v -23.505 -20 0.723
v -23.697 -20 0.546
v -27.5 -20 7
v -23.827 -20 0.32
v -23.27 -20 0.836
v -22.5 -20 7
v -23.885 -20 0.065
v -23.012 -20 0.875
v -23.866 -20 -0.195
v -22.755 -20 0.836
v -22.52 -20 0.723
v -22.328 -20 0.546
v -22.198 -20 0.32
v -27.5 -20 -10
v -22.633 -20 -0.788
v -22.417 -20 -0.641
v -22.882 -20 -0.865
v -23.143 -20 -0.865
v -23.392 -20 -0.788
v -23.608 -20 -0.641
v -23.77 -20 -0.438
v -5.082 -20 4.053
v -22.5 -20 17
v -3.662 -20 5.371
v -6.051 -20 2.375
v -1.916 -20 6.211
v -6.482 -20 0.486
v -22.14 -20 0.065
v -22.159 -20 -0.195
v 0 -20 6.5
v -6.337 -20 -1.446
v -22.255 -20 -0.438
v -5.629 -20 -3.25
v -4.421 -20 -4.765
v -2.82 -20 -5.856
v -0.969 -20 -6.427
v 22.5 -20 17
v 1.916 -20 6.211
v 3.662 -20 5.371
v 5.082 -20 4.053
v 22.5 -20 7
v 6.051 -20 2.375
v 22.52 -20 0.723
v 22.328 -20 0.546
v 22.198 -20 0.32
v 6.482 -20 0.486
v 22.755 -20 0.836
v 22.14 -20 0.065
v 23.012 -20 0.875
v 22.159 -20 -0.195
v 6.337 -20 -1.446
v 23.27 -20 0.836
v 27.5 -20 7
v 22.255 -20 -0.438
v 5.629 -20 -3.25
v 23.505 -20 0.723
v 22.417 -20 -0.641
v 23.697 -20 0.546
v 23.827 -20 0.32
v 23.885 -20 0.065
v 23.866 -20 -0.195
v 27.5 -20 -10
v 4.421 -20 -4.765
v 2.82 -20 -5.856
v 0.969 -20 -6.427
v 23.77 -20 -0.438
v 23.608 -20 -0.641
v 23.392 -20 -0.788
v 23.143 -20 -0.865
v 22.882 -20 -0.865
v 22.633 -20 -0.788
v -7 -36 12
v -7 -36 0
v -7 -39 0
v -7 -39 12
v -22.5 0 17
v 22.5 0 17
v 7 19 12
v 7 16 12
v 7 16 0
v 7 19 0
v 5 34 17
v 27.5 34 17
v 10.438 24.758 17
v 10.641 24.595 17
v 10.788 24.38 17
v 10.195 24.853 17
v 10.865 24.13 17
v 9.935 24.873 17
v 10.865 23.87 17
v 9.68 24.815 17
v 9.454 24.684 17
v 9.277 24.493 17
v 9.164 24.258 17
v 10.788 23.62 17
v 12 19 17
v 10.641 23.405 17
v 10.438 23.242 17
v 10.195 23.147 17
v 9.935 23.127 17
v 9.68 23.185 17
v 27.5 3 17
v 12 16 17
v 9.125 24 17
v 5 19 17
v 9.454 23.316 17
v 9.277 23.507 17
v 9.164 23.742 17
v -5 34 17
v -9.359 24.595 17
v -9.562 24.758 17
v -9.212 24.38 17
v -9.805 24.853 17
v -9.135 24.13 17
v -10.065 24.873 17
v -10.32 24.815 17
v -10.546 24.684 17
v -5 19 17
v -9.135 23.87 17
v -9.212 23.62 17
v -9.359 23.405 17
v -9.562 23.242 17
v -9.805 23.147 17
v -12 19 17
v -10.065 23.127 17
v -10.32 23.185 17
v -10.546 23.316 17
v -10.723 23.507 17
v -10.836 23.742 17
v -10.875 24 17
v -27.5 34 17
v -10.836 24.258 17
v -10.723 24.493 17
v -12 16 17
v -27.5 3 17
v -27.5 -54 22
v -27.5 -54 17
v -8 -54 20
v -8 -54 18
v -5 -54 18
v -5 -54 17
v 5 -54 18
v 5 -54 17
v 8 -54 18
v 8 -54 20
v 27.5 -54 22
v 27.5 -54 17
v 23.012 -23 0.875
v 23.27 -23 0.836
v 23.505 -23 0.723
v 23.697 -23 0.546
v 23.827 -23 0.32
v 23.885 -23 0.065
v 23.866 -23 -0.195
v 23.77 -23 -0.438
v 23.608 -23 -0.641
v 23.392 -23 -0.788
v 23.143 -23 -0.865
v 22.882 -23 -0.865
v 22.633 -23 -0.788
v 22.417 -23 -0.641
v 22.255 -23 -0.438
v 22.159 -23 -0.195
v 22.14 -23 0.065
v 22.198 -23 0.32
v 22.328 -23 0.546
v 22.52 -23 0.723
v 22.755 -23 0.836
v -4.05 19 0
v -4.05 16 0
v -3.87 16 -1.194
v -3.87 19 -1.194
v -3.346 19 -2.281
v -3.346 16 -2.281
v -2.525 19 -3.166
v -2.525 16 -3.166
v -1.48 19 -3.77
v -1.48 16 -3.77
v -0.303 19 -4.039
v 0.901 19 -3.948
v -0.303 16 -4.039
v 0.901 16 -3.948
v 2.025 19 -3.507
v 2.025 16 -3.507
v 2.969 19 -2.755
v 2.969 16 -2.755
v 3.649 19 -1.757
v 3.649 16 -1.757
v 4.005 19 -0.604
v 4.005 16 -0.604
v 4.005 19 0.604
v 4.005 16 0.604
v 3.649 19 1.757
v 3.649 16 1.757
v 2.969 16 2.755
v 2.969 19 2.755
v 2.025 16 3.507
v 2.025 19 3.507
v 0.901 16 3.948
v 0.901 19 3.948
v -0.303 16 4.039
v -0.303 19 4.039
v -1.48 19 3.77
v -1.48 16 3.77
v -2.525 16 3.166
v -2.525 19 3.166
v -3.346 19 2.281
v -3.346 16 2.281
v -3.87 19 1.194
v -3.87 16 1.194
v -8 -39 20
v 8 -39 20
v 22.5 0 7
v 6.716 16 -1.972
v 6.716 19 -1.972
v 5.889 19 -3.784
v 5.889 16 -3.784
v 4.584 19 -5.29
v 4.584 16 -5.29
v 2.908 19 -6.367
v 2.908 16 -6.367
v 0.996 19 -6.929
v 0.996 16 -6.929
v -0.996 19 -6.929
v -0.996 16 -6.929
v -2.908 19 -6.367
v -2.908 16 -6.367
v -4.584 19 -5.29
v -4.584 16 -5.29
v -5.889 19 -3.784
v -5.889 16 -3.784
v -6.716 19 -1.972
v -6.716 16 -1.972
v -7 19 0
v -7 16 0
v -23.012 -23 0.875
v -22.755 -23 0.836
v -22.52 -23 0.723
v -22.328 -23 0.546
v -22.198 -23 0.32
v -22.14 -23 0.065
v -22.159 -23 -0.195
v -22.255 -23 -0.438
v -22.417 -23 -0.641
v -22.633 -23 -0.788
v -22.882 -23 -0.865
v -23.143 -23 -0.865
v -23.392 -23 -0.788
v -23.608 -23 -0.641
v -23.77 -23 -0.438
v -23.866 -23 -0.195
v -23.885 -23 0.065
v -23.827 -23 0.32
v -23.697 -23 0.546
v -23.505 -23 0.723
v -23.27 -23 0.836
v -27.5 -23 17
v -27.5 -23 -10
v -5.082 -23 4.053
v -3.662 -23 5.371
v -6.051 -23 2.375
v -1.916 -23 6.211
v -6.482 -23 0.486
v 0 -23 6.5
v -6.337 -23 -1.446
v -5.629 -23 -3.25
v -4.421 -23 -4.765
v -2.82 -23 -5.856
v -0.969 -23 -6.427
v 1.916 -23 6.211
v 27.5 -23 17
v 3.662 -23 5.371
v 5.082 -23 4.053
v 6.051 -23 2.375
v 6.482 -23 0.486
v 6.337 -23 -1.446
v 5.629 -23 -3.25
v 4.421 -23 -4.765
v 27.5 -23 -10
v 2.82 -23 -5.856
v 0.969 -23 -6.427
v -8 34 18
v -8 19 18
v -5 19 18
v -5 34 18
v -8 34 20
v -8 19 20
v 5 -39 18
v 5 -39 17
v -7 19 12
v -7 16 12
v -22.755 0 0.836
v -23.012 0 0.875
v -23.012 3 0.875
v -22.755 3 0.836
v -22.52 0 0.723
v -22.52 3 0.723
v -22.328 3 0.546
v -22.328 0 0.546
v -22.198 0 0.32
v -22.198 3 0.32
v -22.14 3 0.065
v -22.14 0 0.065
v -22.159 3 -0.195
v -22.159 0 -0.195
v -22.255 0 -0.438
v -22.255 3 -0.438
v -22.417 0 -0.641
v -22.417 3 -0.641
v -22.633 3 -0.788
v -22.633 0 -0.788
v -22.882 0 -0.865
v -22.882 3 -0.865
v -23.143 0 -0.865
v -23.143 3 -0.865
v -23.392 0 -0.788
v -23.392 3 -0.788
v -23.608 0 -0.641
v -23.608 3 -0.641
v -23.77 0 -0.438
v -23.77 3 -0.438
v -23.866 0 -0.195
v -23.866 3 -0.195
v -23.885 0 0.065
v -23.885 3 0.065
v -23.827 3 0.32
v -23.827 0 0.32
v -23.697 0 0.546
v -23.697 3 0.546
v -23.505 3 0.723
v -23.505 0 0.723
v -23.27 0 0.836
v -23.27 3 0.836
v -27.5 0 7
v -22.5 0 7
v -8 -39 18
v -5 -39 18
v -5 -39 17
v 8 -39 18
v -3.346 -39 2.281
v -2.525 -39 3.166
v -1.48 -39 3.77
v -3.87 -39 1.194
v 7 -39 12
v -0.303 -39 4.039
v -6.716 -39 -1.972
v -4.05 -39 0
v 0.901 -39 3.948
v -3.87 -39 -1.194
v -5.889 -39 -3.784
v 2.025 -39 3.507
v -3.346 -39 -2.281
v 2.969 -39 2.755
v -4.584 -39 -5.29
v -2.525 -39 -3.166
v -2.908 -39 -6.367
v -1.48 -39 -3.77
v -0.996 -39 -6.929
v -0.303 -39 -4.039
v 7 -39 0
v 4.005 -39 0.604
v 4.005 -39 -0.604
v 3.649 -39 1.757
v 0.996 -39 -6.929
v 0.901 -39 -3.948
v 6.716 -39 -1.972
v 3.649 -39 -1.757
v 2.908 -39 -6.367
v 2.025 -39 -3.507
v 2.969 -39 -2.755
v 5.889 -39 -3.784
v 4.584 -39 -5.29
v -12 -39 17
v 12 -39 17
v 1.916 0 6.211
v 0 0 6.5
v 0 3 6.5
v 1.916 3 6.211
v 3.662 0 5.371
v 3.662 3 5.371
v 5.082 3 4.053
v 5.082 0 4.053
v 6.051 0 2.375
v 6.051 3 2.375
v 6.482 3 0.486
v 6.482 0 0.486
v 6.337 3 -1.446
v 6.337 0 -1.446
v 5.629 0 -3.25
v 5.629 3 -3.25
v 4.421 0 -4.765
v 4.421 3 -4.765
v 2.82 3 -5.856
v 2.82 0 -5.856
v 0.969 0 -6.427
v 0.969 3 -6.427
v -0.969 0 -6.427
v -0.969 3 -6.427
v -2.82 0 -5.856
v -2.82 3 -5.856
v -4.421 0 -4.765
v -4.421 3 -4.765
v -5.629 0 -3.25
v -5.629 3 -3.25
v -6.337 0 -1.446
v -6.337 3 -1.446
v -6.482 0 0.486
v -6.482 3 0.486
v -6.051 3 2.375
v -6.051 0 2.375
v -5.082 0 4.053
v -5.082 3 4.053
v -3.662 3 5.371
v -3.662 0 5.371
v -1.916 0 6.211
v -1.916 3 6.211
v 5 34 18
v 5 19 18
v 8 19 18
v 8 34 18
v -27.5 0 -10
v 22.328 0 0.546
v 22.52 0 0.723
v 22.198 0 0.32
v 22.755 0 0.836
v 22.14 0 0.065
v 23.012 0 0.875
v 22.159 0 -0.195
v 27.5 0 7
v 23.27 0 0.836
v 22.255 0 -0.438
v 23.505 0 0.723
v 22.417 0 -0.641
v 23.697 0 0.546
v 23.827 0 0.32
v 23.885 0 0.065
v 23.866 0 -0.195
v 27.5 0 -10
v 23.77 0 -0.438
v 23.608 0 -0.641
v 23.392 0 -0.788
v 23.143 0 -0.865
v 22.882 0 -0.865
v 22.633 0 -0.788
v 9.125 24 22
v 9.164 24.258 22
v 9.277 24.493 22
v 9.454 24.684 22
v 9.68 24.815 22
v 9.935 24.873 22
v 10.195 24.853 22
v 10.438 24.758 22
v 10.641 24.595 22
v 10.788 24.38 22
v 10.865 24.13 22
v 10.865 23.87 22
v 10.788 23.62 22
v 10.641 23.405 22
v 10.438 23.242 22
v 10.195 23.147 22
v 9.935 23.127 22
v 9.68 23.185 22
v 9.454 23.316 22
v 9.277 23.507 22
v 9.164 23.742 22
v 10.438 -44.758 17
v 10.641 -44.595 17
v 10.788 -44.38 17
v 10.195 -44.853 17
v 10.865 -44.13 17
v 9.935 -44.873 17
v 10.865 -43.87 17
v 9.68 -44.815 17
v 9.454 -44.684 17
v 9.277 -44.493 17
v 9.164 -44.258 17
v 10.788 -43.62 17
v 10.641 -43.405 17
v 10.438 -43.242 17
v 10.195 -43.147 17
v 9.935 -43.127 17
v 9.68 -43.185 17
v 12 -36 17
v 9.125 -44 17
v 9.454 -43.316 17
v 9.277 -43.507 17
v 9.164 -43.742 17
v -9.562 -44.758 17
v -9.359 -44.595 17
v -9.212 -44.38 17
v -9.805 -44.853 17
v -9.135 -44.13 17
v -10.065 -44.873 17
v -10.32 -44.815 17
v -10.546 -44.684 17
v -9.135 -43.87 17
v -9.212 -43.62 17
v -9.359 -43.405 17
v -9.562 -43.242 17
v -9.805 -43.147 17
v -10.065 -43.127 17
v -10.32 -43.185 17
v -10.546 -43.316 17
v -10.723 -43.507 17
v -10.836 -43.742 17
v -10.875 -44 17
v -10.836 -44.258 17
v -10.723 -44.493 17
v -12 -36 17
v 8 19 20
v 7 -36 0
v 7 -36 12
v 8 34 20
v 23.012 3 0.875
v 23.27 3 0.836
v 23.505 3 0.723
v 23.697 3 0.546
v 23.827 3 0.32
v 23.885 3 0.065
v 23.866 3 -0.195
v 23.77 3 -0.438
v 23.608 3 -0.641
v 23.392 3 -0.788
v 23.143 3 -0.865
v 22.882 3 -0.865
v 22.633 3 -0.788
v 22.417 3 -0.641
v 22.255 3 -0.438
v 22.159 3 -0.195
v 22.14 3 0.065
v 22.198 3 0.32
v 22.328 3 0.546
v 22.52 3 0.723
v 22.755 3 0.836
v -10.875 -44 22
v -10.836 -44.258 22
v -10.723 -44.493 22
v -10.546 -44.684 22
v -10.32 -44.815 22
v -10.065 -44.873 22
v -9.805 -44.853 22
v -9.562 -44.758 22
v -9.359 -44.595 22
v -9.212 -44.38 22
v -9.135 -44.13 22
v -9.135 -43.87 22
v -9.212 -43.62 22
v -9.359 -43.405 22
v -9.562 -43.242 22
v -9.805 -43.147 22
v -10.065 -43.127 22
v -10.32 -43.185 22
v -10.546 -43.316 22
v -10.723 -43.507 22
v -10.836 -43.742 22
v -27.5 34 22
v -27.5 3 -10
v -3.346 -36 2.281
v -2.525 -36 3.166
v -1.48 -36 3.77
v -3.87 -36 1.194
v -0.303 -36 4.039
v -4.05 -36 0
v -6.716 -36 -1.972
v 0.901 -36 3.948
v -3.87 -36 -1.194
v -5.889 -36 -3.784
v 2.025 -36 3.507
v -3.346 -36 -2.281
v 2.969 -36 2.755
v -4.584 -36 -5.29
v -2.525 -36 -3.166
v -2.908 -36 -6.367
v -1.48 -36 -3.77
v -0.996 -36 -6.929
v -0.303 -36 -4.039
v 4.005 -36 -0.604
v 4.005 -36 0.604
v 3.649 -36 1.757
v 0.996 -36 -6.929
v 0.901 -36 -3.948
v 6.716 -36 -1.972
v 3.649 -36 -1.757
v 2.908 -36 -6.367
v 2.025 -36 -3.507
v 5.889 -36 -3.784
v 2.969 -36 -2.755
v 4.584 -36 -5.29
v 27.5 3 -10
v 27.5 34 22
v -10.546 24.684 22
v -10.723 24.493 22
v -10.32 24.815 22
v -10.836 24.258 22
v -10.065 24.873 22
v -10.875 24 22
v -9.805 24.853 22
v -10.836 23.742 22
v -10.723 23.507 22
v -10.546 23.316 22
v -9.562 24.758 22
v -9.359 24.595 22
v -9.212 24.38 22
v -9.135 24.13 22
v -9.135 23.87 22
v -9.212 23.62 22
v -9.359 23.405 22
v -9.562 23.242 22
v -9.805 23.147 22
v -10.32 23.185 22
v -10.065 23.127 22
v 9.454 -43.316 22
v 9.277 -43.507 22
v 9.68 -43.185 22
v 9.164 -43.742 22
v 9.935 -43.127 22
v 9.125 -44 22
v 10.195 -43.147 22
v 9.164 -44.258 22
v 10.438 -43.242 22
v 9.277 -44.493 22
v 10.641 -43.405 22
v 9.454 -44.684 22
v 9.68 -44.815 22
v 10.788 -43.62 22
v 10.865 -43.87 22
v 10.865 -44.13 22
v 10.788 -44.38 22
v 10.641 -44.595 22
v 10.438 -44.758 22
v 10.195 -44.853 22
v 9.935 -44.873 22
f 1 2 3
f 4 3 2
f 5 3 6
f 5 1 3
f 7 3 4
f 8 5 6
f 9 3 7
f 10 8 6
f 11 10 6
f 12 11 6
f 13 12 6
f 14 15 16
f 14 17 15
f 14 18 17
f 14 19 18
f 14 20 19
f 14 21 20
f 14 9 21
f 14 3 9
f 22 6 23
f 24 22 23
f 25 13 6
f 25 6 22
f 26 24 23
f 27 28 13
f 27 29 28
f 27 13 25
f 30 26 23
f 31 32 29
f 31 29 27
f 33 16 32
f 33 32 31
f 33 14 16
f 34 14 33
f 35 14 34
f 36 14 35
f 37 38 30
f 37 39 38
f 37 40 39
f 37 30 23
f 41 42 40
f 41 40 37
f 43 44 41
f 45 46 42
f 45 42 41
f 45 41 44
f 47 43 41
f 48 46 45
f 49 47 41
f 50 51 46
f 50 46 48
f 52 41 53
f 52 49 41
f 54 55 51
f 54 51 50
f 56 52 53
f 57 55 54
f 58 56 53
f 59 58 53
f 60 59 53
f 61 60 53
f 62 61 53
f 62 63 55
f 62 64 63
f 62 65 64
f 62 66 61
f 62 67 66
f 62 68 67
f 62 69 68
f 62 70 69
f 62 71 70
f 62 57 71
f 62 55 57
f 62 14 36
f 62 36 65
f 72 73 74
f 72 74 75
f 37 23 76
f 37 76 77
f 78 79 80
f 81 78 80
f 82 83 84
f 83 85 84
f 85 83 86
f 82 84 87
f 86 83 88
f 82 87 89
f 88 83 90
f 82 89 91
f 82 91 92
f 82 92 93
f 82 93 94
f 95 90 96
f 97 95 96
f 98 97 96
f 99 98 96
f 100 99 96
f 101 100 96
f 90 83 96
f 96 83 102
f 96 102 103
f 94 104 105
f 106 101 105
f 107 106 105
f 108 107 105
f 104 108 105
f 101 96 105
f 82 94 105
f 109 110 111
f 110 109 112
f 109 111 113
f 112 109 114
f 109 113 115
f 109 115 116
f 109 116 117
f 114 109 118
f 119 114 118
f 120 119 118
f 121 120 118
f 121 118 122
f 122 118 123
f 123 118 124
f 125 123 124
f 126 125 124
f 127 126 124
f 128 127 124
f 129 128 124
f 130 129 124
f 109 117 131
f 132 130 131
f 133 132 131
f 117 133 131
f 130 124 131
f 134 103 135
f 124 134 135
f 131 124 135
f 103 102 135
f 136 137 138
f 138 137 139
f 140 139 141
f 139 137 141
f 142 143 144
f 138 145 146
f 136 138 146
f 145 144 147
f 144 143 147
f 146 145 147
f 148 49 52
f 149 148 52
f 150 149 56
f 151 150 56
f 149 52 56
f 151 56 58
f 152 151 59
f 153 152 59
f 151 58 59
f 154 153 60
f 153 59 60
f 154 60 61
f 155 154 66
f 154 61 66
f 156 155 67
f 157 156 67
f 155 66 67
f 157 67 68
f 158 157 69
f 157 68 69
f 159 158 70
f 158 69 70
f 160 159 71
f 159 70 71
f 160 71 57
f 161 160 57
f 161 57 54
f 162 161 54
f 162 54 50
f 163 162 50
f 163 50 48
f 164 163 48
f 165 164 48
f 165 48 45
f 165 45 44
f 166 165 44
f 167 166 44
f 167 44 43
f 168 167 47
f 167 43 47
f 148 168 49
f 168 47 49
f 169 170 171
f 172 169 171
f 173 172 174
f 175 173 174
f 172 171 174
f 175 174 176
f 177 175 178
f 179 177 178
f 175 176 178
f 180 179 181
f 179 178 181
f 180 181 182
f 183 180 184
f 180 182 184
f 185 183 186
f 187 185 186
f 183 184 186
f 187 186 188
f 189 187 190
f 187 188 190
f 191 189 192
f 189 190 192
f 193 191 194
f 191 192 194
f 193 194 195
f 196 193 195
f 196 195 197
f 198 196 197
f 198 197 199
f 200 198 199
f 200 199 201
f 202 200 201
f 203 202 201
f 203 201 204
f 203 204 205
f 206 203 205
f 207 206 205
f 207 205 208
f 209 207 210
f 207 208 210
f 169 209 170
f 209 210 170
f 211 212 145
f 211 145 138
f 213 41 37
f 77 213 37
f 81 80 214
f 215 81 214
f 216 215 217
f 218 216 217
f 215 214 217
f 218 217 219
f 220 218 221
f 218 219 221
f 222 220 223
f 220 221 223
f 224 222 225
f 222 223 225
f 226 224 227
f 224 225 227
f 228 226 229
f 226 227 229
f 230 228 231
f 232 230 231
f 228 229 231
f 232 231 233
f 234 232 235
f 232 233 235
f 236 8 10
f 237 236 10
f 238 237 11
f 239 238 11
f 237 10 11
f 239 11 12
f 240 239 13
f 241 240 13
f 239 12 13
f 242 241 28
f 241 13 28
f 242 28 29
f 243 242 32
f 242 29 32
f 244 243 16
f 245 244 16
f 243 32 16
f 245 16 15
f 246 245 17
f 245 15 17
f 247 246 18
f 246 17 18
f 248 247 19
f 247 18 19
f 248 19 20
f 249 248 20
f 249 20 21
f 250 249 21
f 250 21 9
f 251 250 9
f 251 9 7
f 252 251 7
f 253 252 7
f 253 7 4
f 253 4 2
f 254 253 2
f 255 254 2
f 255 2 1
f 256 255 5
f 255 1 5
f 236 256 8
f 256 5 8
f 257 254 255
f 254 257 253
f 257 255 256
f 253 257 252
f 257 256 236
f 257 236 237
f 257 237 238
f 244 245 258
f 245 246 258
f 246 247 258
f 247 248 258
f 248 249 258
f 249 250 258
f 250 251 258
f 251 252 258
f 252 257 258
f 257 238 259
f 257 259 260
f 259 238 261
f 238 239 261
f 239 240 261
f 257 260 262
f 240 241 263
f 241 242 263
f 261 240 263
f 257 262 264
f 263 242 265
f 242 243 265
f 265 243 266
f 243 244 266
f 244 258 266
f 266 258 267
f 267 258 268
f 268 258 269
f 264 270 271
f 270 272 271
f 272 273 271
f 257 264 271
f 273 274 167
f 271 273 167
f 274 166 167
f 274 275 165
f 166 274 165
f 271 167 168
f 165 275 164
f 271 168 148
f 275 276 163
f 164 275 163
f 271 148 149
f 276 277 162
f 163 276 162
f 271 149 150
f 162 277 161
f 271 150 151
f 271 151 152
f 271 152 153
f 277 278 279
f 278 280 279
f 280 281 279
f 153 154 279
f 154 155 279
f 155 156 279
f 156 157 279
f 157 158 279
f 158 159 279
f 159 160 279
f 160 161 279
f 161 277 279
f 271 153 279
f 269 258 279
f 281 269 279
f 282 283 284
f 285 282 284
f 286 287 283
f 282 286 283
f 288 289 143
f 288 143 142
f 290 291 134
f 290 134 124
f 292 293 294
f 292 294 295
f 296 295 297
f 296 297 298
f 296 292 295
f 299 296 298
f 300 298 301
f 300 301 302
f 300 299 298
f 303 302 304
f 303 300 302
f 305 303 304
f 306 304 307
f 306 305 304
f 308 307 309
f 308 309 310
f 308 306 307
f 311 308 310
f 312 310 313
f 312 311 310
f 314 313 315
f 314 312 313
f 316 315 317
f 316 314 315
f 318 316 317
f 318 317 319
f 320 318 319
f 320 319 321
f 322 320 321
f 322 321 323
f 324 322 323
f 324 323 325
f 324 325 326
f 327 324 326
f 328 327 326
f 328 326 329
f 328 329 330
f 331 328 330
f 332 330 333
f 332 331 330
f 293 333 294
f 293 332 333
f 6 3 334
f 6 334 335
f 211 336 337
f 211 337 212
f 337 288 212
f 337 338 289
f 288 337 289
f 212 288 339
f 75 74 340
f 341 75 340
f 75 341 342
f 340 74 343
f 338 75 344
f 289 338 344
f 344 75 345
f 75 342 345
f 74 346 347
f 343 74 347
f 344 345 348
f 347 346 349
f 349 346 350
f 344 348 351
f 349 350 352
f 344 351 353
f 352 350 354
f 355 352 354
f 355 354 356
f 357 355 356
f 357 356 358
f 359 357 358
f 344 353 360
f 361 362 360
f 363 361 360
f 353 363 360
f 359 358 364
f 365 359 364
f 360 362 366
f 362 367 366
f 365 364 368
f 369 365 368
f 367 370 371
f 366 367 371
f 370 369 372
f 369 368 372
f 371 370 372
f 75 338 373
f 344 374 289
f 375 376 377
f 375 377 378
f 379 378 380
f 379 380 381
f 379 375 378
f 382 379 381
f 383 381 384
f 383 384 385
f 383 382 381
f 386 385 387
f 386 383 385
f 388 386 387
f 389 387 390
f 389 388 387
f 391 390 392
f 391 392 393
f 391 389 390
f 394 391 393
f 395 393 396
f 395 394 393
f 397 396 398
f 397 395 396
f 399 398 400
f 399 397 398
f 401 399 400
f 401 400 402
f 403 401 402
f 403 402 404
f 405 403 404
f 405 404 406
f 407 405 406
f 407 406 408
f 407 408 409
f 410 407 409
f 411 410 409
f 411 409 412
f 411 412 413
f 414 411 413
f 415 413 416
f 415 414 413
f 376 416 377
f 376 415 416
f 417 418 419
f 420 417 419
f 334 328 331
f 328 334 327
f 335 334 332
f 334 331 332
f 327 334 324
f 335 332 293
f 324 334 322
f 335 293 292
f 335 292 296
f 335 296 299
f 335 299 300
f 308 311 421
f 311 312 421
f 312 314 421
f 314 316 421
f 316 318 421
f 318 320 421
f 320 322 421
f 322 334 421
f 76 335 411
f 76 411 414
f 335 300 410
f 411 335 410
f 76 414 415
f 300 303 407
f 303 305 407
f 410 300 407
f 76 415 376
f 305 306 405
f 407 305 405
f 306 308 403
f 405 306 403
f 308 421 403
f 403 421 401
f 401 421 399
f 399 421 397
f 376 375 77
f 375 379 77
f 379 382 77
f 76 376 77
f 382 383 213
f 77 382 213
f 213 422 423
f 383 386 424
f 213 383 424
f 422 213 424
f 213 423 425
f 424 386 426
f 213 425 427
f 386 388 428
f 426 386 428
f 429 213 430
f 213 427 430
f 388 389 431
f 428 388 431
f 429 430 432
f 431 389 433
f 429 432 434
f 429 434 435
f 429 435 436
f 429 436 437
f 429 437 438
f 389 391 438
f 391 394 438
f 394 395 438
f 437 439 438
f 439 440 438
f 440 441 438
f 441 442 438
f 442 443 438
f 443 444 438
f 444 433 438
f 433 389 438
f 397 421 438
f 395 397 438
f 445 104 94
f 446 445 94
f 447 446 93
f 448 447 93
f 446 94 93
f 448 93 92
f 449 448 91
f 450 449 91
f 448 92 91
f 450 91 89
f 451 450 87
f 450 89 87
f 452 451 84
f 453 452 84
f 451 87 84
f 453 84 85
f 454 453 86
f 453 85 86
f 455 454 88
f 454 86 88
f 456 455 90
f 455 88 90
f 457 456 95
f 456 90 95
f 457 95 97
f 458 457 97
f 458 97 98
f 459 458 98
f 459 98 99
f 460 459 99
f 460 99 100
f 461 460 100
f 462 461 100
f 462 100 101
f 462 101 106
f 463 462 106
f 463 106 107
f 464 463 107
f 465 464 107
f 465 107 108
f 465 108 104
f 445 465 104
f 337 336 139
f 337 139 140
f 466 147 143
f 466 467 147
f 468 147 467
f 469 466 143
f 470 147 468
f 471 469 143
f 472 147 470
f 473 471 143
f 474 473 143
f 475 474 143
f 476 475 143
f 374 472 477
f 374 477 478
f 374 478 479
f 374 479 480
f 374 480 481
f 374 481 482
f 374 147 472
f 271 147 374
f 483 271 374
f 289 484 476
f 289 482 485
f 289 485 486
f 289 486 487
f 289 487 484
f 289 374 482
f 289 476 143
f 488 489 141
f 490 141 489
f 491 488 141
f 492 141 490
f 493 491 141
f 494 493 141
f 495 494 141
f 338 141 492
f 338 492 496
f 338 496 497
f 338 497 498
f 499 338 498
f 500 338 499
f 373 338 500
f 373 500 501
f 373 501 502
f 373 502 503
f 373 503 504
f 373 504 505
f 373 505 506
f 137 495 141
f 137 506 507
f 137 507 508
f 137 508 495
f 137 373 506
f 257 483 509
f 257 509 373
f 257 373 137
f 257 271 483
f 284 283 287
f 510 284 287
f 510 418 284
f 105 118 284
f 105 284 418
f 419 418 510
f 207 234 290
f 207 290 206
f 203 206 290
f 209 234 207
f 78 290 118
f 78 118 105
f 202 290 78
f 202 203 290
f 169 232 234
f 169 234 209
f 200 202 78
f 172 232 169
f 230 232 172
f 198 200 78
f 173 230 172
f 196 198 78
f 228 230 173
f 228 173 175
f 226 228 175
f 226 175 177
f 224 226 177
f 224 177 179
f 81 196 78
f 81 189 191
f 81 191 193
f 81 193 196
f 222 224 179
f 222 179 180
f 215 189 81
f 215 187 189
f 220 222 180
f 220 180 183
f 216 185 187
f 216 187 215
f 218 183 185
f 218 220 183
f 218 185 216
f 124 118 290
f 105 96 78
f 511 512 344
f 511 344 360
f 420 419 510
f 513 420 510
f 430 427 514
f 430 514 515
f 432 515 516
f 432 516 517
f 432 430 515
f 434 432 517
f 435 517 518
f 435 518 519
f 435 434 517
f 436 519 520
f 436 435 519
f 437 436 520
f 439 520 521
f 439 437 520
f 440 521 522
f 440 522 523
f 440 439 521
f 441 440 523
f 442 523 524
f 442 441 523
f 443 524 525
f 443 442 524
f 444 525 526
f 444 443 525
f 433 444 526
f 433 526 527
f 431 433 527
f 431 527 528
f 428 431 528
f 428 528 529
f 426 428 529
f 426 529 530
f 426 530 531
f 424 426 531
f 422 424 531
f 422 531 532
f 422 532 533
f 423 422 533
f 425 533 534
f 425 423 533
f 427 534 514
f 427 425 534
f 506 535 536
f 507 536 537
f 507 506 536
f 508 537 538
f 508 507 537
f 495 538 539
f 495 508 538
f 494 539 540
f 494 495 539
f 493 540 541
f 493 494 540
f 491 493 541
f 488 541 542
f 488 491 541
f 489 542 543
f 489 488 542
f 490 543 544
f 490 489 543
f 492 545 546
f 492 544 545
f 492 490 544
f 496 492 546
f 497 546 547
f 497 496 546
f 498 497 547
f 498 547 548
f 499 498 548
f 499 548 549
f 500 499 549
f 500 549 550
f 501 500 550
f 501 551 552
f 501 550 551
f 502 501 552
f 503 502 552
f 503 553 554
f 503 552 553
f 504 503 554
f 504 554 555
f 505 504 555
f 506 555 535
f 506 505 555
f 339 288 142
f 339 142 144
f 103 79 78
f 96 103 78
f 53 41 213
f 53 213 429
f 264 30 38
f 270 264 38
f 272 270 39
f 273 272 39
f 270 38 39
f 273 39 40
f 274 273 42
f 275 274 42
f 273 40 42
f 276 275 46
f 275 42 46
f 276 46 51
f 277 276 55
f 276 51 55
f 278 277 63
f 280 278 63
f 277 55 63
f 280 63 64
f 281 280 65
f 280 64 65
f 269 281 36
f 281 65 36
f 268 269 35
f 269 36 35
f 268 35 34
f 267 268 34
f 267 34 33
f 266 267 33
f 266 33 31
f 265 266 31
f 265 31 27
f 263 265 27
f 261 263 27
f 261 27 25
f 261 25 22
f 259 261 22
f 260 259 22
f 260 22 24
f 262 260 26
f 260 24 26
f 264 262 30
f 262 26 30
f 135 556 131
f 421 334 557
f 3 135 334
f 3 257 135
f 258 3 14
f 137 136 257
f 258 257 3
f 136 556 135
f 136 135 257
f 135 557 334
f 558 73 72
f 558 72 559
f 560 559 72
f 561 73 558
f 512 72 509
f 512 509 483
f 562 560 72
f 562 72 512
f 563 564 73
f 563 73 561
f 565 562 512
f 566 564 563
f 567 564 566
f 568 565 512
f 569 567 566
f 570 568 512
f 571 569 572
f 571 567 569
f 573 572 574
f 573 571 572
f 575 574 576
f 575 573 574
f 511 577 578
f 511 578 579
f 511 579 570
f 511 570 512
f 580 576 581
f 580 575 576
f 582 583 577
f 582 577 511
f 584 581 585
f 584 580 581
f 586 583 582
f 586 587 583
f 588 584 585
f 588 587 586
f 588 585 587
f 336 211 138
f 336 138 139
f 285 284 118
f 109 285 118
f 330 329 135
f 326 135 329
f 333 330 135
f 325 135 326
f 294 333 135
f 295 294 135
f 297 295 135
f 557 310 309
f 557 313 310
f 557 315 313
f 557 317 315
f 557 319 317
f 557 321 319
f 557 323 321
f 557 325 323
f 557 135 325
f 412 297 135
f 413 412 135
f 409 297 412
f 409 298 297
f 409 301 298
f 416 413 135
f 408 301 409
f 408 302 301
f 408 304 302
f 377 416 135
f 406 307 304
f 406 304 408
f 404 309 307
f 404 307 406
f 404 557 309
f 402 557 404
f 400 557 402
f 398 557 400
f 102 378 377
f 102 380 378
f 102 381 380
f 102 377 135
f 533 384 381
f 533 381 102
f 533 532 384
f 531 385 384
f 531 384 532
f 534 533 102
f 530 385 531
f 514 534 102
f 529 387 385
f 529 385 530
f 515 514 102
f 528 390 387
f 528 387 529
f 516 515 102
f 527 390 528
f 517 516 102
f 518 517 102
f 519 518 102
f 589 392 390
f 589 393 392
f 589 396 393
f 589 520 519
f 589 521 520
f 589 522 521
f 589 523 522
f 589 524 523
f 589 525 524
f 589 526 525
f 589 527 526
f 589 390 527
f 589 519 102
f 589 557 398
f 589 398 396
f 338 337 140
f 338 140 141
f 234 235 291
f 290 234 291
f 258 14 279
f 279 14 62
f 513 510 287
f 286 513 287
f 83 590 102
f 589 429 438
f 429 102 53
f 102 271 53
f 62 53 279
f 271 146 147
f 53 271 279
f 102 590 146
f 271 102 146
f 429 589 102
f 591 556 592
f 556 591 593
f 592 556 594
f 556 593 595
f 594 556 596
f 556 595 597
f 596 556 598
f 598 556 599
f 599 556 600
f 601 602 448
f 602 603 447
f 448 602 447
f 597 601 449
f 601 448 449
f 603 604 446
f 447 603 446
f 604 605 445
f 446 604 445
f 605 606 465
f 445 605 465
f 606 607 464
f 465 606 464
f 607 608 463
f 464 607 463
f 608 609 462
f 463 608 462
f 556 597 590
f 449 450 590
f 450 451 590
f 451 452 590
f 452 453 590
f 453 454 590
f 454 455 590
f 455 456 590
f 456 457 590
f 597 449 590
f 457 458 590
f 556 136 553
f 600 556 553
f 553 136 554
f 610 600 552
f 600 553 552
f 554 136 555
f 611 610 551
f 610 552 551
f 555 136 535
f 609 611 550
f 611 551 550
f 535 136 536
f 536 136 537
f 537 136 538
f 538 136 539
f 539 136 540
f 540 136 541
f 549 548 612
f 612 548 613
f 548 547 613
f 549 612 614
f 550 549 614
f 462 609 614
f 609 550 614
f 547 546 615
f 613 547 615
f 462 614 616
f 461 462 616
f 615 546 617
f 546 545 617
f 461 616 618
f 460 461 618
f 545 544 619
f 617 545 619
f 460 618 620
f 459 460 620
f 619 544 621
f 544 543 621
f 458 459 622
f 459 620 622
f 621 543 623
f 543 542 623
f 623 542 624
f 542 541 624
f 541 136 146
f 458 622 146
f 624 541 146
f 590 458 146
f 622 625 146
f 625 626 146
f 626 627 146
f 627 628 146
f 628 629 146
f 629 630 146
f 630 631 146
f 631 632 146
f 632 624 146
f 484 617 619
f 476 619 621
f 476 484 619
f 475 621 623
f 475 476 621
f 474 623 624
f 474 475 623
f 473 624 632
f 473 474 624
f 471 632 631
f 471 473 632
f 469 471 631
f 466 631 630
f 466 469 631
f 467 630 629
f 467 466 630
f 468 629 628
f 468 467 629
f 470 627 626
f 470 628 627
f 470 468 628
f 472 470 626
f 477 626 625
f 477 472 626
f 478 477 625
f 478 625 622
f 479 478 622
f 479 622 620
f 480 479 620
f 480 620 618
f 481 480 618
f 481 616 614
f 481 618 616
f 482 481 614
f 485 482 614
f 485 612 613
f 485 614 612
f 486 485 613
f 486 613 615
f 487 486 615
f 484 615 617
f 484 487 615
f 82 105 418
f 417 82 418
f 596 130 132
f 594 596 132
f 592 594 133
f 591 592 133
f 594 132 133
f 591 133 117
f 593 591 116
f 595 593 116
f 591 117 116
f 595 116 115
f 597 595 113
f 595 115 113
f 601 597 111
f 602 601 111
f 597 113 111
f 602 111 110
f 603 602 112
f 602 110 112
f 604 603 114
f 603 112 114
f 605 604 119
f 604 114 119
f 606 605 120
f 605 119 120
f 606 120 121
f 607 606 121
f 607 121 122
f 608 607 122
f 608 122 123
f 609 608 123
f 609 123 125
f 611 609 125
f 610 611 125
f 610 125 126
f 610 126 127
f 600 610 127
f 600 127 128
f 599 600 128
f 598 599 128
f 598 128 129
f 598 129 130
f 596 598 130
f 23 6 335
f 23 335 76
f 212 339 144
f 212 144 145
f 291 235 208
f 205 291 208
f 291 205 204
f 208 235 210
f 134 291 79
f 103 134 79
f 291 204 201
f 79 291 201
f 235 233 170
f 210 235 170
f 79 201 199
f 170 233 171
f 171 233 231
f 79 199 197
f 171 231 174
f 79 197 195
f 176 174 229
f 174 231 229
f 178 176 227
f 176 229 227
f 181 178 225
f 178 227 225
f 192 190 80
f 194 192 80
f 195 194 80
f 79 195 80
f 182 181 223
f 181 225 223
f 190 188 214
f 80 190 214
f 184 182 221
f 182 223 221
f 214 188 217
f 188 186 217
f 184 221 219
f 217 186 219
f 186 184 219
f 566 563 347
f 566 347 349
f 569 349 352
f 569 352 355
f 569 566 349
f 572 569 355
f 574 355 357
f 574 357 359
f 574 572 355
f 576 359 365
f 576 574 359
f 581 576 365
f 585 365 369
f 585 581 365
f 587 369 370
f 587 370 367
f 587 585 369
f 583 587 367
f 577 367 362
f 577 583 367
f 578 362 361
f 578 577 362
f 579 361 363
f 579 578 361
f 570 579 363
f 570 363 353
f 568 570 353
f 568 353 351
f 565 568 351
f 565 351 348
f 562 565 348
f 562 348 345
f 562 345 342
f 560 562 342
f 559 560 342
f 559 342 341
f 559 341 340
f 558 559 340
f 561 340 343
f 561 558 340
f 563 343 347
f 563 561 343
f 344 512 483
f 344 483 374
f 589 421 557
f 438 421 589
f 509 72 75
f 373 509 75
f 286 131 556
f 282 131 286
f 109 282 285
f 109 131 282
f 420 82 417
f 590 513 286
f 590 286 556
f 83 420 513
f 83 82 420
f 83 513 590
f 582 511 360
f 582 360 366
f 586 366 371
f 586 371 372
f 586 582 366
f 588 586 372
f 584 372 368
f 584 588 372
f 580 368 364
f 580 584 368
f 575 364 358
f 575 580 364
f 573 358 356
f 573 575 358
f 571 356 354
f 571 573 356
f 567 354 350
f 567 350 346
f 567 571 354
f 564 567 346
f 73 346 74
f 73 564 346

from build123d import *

# Parameters (mm, degrees)
SKETCH1_W                = 55
SKETCH1_H                = 32
SKETCH1_R                = 0.875
SKETCH1_R_2              = 6.5
BOSS_EXTRUDE1_DEPTH      = 3
BOSS_EXTRUDE2_START      = 3
SKETCH1_4_W              = 55
SKETCH1_4_H              = 5
BOSS_EXTRUDE2_DEPTH      = 13
BOSS_EXTRUDE3_START      = 16
BOSS_EXTRUDE3_DEPTH      = 3
BOSS_EXTRUDE4_START      = 19
BOSS_EXTRUDE4_DEPTH      = 15
SKETCH1_7_W              = 55
SKETCH1_7_H              = 5
BOSS_EXTRUDE5_DEPTH      = 10
SKETCH2_R                = 0.875
CUT_EXTRUDE1_DEPTH       = 52.393092921
CHAMFER1_SIZE            = 5
CHAMFER1_OF_MIRROR4_SIZE = 5
SKETCH3_W                = 5
SKETCH3_H                = 10
BOSS_EXTRUDE6_DEPTH      = 23


with BuildPart() as part:
    # Sketch1 → Boss-Extrude1 (new body)
    with BuildSketch(Plane(origin=(0, 0, 0), x_dir=(1, 0, 0), z_dir=(0, 1, 0))):
        with Locations((0, -6)):
            Rectangle(SKETCH1_W, SKETCH1_H)
        with Locations(Location((-23.0125, 0, 0), (0, 0, 270))):
            Circle(SKETCH1_R, mode=Mode.SUBTRACT)
        with Locations(Location((23.0125, 0, 0), (0, 0, 270))):
            Circle(SKETCH1_R, mode=Mode.SUBTRACT)
        with Locations(Location((0, 0, 0), (0, 0, 270))):
            Circle(SKETCH1_R_2, mode=Mode.SUBTRACT)
    boss_extrude1 = extrude(amount=BOSS_EXTRUDE1_DEPTH)

    # Sketch1<4> → Boss-Extrude2 (add)
    with BuildSketch(Plane(origin=(0, 0, 0), x_dir=(1, 0, 0), z_dir=(0, 1, 0)).offset(BOSS_EXTRUDE2_START)):
        with Locations((0, -19.5)):
            Rectangle(SKETCH1_4_W, SKETCH1_4_H)
    boss_extrude2 = extrude(amount=BOSS_EXTRUDE2_DEPTH)

    # Sketch1<5> → Boss-Extrude3 (add)
    with BuildSketch(Plane(origin=(0, 0, 0), x_dir=(1, 0, 0), z_dir=(0, 1, 0)).offset(BOSS_EXTRUDE3_START)):
        with BuildLine():
            Line((7, -17), (7, 0))
            Line((7, 0), (6.5, 0))
            ThreePointArc((6.5, 0), (0, -6.5), (-6.5, 0))
            Line((-6.5, 0), (-7, 0))
            Line((-7, 0), (-7, -17))
            Line((-7, -17), (-5, -17))
            Line((-5, -17), (5, -17))
            Line((5, -17), (7, -17))
        make_face()
        with BuildLine():
            ThreePointArc((-6.5, 0), (0, -6.5), (6.5, 0))
            Line((6.5, 0), (4.05, 0))
            ThreePointArc((4.05, 0), (0, -4.05), (-4.05, 0))
            Line((-4.05, 0), (-6.5, 0))
        make_face()
        with BuildLine():
            Line((4.05, 0), (6.5, 0))
            ThreePointArc((6.5, 0), (0, 6.5), (-6.5, 0))
            Line((-6.5, 0), (-4.05, 0))
            ThreePointArc((-4.05, 0), (0, 4.05), (4.05, 0))
        make_face()
        with BuildLine():
            Line((6.5, 0), (7, 0))
            ThreePointArc((7, 0), (0, 7), (-7, 0))
            Line((-7, 0), (-6.5, 0))
            ThreePointArc((-6.5, 0), (0, 6.5), (6.5, 0))
        make_face()
        Polygon((27.5, -17), (7, -17), (5, -17), (5, -18), (8, -18), (8, -20), (-8, -20), (-8, -18), (-5, -18), (-5, -17), (-7, -17), (-27.5, -17), (-27.5, -22), (27.5, -22), align=None)
        Polygon((5, -18), (5, -17), (-5, -17), (-5, -18), (-8, -18), (-8, -20), (8, -20), (8, -18), align=None)
    boss_extrude3 = extrude(amount=BOSS_EXTRUDE3_DEPTH)

    # Sketch1<6> → Boss-Extrude4 (add)
    with BuildSketch(Plane(origin=(0, 0, 0), x_dir=(1, 0, 0), z_dir=(0, 1, 0)).offset(BOSS_EXTRUDE4_START)):
        Polygon((-7, -17), (-27.5, -17), (-27.5, -22), (27.5, -22), (27.5, -17), (7, -17), (5, -17), (5, -18), (8, -18), (8, -20), (-8, -20), (-8, -18), (-5, -18), (-5, -17), align=None)
    boss_extrude4 = extrude(amount=BOSS_EXTRUDE4_DEPTH)

    # Sketch1<7> → Boss-Extrude5 (add)
    with BuildSketch(Plane(origin=(0, 0, 0), x_dir=(1, 0, 0), z_dir=(0, 1, 0))):
        with Locations((0, -19.5)):
            Rectangle(SKETCH1_7_W, SKETCH1_7_H)
    boss_extrude5 = extrude(amount=-BOSS_EXTRUDE5_DEPTH)

    # Sketch2 → Cut-Extrude1 (cut, through all)
    with BuildSketch(Plane(origin=(0, 0, 17), x_dir=(-1, 0, 0), z_dir=(0, 0, -1))):
        with Locations((-10, 24)):
            Circle(SKETCH2_R)
        with Locations((10, 24)):
            Circle(SKETCH2_R)
    cut_extrude1 = extrude(amount=-CUT_EXTRUDE1_DEPTH, mode=Mode.SUBTRACT)

    # Chamfer1
    chamfer1_edges = [part.edges().sort_by_distance(p)[0] for p in [
        (7, 17.5, 17),
        (-7, 17.5, 17),
    ]]
    chamfer(chamfer1_edges, length=CHAMFER1_SIZE)

    # Mirror4: Boss-Extrude1, Boss-Extrude2, Boss-Extrude3, Boss-Extrude4, Boss-Extrude5, Cut-Extrude1 across plane
    add(boss_extrude1.mirror(Plane(origin=(0, -10, 0), x_dir=(0, 0, 1), z_dir=(0, -1, 0))))
    add(boss_extrude2.mirror(Plane(origin=(0, -10, 0), x_dir=(0, 0, 1), z_dir=(0, -1, 0))))
    add(boss_extrude3.mirror(Plane(origin=(0, -10, 0), x_dir=(0, 0, 1), z_dir=(0, -1, 0))))
    add(boss_extrude4.mirror(Plane(origin=(0, -10, 0), x_dir=(0, 0, 1), z_dir=(0, -1, 0))))
    add(boss_extrude5.mirror(Plane(origin=(0, -10, 0), x_dir=(0, 0, 1), z_dir=(0, -1, 0))))
    add(cut_extrude1.mirror(Plane(origin=(0, -10, 0), x_dir=(0, 0, 1), z_dir=(0, -1, 0))), mode=Mode.SUBTRACT)

    # Chamfer1 of Mirror4
    chamfer1_of_mirror4_edges = [part.edges().sort_by_distance(p)[0] for p in [
        (7, -37.5, 17),
        (-7, -37.5, 17),
    ]]
    chamfer(chamfer1_of_mirror4_edges, length=CHAMFER1_OF_MIRROR4_SIZE)

    # Sketch3 → Boss-Extrude6 (add)
    with BuildSketch(Plane.XZ.offset(23)):
        with Locations((-25, 12)):
            Rectangle(SKETCH3_W, SKETCH3_H)
        with Locations((25, 12)):
            Rectangle(SKETCH3_W, SKETCH3_H)
    extrude(amount=-BOSS_EXTRUDE6_DEPTH)


solid = part.part
